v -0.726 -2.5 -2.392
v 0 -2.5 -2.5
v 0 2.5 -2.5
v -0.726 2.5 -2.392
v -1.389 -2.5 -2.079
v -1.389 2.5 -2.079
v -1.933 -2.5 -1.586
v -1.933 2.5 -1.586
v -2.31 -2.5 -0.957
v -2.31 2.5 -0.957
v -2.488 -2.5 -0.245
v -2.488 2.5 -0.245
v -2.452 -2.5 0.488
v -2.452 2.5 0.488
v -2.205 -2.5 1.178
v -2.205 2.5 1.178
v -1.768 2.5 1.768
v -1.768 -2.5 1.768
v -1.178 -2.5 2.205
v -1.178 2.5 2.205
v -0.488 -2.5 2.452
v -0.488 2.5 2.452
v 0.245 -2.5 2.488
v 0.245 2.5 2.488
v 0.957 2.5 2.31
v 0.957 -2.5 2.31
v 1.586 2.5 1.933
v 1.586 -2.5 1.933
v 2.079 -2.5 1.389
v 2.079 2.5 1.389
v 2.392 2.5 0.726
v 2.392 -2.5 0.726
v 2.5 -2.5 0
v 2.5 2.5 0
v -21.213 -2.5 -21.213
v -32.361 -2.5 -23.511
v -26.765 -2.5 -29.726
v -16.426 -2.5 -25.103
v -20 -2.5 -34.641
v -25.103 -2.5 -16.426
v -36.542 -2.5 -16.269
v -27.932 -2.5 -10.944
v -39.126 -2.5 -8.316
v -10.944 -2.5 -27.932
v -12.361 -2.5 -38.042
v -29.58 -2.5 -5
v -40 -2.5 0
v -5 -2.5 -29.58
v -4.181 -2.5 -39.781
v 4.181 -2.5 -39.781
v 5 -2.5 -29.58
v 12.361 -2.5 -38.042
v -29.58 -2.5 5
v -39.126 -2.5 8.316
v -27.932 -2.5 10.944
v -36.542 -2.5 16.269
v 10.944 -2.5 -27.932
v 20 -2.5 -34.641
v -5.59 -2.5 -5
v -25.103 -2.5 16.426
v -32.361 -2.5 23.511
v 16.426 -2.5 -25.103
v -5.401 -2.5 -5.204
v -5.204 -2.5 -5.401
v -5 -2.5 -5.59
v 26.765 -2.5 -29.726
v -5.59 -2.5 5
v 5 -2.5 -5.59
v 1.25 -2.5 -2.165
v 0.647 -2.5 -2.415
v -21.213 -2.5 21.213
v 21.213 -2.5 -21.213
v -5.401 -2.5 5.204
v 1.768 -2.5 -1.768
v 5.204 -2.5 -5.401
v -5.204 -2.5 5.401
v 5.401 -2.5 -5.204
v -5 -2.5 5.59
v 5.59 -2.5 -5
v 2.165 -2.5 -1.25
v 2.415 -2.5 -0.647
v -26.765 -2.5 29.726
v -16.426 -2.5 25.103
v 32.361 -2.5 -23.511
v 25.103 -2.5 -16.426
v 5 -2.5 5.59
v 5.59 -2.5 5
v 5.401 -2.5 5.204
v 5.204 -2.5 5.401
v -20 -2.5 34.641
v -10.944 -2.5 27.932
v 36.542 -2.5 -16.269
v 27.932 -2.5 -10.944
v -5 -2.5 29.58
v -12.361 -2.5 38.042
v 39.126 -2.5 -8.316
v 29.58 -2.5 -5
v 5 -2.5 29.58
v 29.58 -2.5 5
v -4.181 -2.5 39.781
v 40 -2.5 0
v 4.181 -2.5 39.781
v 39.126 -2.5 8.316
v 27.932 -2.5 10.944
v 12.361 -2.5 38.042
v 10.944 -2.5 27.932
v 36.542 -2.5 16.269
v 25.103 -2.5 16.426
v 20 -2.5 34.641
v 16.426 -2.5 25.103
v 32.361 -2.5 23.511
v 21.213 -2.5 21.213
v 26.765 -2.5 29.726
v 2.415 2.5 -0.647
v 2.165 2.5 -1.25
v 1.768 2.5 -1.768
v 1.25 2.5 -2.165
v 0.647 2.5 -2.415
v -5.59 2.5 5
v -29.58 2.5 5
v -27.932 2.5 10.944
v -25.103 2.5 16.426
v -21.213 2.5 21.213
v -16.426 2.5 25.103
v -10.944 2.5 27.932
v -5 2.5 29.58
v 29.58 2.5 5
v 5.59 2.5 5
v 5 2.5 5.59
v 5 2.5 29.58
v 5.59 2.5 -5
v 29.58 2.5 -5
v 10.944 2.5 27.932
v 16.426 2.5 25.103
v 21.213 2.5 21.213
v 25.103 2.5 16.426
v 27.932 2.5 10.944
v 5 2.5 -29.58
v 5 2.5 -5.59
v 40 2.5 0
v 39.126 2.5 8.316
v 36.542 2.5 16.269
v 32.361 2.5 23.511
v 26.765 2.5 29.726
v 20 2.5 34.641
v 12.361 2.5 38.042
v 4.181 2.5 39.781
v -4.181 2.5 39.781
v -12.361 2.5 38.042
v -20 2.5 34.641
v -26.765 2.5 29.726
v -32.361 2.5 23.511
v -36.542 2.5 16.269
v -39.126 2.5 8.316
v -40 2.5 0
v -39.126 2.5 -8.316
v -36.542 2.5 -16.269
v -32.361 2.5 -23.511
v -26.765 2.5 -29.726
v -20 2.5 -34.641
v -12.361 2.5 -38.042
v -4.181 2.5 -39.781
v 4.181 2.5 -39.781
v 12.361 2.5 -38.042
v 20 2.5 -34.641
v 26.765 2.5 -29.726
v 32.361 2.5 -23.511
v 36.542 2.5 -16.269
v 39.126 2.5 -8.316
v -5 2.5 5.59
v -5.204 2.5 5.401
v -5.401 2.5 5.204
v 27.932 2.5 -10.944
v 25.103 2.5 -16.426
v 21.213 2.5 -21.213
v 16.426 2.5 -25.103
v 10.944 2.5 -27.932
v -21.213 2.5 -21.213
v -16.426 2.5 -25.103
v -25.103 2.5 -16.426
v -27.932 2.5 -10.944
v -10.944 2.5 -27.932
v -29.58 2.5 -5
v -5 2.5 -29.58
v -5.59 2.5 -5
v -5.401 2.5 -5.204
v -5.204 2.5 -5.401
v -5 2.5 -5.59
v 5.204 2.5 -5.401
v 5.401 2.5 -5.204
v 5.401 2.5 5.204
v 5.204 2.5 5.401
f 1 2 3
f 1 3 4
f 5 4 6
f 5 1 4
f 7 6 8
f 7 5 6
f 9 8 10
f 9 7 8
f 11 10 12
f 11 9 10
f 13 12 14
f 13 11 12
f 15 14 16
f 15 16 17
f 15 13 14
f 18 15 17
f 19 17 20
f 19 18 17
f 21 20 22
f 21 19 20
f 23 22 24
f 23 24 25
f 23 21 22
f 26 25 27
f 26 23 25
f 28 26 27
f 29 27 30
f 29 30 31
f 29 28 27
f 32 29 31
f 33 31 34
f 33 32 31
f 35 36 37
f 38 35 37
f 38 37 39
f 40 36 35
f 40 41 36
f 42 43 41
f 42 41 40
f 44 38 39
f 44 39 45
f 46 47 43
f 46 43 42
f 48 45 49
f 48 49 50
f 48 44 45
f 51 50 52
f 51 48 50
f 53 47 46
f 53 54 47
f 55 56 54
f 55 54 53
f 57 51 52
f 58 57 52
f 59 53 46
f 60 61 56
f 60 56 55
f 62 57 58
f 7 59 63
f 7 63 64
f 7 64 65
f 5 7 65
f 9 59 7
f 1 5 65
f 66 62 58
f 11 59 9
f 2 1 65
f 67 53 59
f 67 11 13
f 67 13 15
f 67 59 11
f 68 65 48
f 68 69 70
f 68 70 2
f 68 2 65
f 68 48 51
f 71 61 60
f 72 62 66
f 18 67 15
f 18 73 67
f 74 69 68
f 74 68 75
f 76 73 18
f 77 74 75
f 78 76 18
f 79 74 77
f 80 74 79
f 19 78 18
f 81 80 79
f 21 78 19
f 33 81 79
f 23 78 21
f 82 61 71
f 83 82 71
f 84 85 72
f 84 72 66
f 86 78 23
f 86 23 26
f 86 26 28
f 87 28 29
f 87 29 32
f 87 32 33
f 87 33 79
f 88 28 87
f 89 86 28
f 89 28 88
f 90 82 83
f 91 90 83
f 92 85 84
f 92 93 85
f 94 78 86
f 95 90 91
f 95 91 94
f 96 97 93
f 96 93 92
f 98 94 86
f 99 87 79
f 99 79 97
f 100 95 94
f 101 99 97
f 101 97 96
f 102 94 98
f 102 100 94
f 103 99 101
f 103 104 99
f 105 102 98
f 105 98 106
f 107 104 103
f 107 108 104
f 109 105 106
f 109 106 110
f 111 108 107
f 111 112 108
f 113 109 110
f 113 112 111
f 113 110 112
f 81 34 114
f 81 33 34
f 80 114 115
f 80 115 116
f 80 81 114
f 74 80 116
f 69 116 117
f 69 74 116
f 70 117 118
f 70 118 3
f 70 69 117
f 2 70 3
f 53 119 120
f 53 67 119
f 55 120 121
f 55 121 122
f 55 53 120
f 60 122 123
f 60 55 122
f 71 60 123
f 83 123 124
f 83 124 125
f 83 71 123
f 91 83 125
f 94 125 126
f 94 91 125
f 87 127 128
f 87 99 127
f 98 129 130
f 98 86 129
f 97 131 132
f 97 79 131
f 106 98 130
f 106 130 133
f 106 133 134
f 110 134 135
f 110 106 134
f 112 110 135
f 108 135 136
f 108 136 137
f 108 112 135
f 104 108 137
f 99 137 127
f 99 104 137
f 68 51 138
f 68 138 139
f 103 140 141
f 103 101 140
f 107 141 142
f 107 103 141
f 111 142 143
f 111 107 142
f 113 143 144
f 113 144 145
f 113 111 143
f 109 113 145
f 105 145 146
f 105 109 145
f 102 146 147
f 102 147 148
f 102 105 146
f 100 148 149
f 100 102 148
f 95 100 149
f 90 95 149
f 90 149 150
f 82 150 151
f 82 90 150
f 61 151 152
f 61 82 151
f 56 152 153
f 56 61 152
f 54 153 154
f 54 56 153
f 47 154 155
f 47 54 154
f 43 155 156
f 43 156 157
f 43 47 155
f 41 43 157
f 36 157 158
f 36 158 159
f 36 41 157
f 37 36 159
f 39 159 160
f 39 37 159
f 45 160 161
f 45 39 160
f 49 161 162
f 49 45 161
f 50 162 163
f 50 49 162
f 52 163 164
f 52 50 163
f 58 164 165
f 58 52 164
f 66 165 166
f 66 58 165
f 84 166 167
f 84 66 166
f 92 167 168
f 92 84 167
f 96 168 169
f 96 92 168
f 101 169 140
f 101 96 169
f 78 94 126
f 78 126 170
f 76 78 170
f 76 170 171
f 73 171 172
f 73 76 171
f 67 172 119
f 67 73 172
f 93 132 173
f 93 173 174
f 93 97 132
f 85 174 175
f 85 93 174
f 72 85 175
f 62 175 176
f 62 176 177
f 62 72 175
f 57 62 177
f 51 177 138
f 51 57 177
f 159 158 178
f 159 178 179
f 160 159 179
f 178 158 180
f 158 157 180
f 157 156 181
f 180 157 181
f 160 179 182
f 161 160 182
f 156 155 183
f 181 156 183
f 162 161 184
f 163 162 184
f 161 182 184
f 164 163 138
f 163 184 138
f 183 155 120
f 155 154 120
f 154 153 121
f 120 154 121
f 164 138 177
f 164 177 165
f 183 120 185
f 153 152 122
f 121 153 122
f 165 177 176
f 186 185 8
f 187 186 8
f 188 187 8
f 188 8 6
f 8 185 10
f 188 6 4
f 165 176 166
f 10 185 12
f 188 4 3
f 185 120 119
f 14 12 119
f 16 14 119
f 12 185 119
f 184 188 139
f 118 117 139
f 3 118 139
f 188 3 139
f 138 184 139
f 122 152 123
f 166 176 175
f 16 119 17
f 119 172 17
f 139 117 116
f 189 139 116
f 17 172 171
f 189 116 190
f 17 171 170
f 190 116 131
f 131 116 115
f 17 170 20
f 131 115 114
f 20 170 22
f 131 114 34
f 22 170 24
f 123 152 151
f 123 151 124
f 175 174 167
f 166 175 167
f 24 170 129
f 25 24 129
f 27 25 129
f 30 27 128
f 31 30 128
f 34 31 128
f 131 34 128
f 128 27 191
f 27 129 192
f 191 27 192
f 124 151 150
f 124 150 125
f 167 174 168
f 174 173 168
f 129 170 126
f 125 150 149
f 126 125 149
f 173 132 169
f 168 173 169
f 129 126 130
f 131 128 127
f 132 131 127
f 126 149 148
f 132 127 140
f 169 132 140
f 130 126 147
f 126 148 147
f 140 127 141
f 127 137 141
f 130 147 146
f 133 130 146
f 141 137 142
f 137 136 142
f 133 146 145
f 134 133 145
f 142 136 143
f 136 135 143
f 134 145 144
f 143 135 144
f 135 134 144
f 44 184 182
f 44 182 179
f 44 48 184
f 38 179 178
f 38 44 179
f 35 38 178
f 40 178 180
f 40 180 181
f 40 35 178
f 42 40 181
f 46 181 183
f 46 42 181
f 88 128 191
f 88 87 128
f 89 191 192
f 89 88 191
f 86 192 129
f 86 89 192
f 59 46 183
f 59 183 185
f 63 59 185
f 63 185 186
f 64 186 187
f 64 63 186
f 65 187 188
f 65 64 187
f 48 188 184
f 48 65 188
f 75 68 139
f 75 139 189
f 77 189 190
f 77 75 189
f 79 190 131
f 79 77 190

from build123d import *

# Parameters (mm, degrees)
F0_R     = 40
F1_DEPTH = 2.5


with BuildPart() as f1:
    # F0 (on Front) → F1 (new body, symmetric)
    with BuildSketch(Plane.XZ):
        Circle(F0_R)
        with BuildLine():
            Line((-29.580399, -5), (-5.59017, -5))
            ThreePointArc((-5.59017, -5), (-5.303301, -5.303301), (-5, -5.59017))
            Line((-5, -5.59017), (-5, -29.580399))
            ThreePointArc((-5, -29.580399), (-21.213203, -21.213203), (-29.580399, -5))
        make_face(mode=Mode.SUBTRACT)
        with BuildLine():
            Line((5, -29.580399), (5, -5.59017))
            ThreePointArc((5, -5.59017), (5.303301, -5.303301), (5.59017, -5))
            Line((5.59017, -5), (29.580399, -5))
            ThreePointArc((29.580399, -5), (21.213203, -21.213203), (5, -29.580399))
        make_face(mode=Mode.SUBTRACT)
        with BuildLine():
            Line((-5, 29.580399), (-5, 5.59017))
            ThreePointArc((-5, 5.59017), (-5.303301, 5.303301), (-5.59017, 5))
            Line((-5.59017, 5), (-29.580399, 5))
            ThreePointArc((-29.580399, 5), (-21.213203, 21.213203), (-5, 29.580399))
        make_face(mode=Mode.SUBTRACT)
        with BuildLine():
            ThreePointArc((0, -2.5), (-1.767767, 1.767767), (2.5, 0))
            ThreePointArc((2.5, 0), (1.767767, -1.767767), (0, -2.5))
        make_face(mode=Mode.SUBTRACT)
        with BuildLine():
            ThreePointArc((5, 29.580399), (21.213203, 21.213203), (29.580399, 5))
            Line((29.580399, 5), (5.59017, 5))
            ThreePointArc((5.59017, 5), (5.303301, 5.303301), (5, 5.59017))
            Line((5, 5.59017), (5, 29.580399))
        make_face(mode=Mode.SUBTRACT)
    extrude(amount=F1_DEPTH, both=True)


solid = f1.part
